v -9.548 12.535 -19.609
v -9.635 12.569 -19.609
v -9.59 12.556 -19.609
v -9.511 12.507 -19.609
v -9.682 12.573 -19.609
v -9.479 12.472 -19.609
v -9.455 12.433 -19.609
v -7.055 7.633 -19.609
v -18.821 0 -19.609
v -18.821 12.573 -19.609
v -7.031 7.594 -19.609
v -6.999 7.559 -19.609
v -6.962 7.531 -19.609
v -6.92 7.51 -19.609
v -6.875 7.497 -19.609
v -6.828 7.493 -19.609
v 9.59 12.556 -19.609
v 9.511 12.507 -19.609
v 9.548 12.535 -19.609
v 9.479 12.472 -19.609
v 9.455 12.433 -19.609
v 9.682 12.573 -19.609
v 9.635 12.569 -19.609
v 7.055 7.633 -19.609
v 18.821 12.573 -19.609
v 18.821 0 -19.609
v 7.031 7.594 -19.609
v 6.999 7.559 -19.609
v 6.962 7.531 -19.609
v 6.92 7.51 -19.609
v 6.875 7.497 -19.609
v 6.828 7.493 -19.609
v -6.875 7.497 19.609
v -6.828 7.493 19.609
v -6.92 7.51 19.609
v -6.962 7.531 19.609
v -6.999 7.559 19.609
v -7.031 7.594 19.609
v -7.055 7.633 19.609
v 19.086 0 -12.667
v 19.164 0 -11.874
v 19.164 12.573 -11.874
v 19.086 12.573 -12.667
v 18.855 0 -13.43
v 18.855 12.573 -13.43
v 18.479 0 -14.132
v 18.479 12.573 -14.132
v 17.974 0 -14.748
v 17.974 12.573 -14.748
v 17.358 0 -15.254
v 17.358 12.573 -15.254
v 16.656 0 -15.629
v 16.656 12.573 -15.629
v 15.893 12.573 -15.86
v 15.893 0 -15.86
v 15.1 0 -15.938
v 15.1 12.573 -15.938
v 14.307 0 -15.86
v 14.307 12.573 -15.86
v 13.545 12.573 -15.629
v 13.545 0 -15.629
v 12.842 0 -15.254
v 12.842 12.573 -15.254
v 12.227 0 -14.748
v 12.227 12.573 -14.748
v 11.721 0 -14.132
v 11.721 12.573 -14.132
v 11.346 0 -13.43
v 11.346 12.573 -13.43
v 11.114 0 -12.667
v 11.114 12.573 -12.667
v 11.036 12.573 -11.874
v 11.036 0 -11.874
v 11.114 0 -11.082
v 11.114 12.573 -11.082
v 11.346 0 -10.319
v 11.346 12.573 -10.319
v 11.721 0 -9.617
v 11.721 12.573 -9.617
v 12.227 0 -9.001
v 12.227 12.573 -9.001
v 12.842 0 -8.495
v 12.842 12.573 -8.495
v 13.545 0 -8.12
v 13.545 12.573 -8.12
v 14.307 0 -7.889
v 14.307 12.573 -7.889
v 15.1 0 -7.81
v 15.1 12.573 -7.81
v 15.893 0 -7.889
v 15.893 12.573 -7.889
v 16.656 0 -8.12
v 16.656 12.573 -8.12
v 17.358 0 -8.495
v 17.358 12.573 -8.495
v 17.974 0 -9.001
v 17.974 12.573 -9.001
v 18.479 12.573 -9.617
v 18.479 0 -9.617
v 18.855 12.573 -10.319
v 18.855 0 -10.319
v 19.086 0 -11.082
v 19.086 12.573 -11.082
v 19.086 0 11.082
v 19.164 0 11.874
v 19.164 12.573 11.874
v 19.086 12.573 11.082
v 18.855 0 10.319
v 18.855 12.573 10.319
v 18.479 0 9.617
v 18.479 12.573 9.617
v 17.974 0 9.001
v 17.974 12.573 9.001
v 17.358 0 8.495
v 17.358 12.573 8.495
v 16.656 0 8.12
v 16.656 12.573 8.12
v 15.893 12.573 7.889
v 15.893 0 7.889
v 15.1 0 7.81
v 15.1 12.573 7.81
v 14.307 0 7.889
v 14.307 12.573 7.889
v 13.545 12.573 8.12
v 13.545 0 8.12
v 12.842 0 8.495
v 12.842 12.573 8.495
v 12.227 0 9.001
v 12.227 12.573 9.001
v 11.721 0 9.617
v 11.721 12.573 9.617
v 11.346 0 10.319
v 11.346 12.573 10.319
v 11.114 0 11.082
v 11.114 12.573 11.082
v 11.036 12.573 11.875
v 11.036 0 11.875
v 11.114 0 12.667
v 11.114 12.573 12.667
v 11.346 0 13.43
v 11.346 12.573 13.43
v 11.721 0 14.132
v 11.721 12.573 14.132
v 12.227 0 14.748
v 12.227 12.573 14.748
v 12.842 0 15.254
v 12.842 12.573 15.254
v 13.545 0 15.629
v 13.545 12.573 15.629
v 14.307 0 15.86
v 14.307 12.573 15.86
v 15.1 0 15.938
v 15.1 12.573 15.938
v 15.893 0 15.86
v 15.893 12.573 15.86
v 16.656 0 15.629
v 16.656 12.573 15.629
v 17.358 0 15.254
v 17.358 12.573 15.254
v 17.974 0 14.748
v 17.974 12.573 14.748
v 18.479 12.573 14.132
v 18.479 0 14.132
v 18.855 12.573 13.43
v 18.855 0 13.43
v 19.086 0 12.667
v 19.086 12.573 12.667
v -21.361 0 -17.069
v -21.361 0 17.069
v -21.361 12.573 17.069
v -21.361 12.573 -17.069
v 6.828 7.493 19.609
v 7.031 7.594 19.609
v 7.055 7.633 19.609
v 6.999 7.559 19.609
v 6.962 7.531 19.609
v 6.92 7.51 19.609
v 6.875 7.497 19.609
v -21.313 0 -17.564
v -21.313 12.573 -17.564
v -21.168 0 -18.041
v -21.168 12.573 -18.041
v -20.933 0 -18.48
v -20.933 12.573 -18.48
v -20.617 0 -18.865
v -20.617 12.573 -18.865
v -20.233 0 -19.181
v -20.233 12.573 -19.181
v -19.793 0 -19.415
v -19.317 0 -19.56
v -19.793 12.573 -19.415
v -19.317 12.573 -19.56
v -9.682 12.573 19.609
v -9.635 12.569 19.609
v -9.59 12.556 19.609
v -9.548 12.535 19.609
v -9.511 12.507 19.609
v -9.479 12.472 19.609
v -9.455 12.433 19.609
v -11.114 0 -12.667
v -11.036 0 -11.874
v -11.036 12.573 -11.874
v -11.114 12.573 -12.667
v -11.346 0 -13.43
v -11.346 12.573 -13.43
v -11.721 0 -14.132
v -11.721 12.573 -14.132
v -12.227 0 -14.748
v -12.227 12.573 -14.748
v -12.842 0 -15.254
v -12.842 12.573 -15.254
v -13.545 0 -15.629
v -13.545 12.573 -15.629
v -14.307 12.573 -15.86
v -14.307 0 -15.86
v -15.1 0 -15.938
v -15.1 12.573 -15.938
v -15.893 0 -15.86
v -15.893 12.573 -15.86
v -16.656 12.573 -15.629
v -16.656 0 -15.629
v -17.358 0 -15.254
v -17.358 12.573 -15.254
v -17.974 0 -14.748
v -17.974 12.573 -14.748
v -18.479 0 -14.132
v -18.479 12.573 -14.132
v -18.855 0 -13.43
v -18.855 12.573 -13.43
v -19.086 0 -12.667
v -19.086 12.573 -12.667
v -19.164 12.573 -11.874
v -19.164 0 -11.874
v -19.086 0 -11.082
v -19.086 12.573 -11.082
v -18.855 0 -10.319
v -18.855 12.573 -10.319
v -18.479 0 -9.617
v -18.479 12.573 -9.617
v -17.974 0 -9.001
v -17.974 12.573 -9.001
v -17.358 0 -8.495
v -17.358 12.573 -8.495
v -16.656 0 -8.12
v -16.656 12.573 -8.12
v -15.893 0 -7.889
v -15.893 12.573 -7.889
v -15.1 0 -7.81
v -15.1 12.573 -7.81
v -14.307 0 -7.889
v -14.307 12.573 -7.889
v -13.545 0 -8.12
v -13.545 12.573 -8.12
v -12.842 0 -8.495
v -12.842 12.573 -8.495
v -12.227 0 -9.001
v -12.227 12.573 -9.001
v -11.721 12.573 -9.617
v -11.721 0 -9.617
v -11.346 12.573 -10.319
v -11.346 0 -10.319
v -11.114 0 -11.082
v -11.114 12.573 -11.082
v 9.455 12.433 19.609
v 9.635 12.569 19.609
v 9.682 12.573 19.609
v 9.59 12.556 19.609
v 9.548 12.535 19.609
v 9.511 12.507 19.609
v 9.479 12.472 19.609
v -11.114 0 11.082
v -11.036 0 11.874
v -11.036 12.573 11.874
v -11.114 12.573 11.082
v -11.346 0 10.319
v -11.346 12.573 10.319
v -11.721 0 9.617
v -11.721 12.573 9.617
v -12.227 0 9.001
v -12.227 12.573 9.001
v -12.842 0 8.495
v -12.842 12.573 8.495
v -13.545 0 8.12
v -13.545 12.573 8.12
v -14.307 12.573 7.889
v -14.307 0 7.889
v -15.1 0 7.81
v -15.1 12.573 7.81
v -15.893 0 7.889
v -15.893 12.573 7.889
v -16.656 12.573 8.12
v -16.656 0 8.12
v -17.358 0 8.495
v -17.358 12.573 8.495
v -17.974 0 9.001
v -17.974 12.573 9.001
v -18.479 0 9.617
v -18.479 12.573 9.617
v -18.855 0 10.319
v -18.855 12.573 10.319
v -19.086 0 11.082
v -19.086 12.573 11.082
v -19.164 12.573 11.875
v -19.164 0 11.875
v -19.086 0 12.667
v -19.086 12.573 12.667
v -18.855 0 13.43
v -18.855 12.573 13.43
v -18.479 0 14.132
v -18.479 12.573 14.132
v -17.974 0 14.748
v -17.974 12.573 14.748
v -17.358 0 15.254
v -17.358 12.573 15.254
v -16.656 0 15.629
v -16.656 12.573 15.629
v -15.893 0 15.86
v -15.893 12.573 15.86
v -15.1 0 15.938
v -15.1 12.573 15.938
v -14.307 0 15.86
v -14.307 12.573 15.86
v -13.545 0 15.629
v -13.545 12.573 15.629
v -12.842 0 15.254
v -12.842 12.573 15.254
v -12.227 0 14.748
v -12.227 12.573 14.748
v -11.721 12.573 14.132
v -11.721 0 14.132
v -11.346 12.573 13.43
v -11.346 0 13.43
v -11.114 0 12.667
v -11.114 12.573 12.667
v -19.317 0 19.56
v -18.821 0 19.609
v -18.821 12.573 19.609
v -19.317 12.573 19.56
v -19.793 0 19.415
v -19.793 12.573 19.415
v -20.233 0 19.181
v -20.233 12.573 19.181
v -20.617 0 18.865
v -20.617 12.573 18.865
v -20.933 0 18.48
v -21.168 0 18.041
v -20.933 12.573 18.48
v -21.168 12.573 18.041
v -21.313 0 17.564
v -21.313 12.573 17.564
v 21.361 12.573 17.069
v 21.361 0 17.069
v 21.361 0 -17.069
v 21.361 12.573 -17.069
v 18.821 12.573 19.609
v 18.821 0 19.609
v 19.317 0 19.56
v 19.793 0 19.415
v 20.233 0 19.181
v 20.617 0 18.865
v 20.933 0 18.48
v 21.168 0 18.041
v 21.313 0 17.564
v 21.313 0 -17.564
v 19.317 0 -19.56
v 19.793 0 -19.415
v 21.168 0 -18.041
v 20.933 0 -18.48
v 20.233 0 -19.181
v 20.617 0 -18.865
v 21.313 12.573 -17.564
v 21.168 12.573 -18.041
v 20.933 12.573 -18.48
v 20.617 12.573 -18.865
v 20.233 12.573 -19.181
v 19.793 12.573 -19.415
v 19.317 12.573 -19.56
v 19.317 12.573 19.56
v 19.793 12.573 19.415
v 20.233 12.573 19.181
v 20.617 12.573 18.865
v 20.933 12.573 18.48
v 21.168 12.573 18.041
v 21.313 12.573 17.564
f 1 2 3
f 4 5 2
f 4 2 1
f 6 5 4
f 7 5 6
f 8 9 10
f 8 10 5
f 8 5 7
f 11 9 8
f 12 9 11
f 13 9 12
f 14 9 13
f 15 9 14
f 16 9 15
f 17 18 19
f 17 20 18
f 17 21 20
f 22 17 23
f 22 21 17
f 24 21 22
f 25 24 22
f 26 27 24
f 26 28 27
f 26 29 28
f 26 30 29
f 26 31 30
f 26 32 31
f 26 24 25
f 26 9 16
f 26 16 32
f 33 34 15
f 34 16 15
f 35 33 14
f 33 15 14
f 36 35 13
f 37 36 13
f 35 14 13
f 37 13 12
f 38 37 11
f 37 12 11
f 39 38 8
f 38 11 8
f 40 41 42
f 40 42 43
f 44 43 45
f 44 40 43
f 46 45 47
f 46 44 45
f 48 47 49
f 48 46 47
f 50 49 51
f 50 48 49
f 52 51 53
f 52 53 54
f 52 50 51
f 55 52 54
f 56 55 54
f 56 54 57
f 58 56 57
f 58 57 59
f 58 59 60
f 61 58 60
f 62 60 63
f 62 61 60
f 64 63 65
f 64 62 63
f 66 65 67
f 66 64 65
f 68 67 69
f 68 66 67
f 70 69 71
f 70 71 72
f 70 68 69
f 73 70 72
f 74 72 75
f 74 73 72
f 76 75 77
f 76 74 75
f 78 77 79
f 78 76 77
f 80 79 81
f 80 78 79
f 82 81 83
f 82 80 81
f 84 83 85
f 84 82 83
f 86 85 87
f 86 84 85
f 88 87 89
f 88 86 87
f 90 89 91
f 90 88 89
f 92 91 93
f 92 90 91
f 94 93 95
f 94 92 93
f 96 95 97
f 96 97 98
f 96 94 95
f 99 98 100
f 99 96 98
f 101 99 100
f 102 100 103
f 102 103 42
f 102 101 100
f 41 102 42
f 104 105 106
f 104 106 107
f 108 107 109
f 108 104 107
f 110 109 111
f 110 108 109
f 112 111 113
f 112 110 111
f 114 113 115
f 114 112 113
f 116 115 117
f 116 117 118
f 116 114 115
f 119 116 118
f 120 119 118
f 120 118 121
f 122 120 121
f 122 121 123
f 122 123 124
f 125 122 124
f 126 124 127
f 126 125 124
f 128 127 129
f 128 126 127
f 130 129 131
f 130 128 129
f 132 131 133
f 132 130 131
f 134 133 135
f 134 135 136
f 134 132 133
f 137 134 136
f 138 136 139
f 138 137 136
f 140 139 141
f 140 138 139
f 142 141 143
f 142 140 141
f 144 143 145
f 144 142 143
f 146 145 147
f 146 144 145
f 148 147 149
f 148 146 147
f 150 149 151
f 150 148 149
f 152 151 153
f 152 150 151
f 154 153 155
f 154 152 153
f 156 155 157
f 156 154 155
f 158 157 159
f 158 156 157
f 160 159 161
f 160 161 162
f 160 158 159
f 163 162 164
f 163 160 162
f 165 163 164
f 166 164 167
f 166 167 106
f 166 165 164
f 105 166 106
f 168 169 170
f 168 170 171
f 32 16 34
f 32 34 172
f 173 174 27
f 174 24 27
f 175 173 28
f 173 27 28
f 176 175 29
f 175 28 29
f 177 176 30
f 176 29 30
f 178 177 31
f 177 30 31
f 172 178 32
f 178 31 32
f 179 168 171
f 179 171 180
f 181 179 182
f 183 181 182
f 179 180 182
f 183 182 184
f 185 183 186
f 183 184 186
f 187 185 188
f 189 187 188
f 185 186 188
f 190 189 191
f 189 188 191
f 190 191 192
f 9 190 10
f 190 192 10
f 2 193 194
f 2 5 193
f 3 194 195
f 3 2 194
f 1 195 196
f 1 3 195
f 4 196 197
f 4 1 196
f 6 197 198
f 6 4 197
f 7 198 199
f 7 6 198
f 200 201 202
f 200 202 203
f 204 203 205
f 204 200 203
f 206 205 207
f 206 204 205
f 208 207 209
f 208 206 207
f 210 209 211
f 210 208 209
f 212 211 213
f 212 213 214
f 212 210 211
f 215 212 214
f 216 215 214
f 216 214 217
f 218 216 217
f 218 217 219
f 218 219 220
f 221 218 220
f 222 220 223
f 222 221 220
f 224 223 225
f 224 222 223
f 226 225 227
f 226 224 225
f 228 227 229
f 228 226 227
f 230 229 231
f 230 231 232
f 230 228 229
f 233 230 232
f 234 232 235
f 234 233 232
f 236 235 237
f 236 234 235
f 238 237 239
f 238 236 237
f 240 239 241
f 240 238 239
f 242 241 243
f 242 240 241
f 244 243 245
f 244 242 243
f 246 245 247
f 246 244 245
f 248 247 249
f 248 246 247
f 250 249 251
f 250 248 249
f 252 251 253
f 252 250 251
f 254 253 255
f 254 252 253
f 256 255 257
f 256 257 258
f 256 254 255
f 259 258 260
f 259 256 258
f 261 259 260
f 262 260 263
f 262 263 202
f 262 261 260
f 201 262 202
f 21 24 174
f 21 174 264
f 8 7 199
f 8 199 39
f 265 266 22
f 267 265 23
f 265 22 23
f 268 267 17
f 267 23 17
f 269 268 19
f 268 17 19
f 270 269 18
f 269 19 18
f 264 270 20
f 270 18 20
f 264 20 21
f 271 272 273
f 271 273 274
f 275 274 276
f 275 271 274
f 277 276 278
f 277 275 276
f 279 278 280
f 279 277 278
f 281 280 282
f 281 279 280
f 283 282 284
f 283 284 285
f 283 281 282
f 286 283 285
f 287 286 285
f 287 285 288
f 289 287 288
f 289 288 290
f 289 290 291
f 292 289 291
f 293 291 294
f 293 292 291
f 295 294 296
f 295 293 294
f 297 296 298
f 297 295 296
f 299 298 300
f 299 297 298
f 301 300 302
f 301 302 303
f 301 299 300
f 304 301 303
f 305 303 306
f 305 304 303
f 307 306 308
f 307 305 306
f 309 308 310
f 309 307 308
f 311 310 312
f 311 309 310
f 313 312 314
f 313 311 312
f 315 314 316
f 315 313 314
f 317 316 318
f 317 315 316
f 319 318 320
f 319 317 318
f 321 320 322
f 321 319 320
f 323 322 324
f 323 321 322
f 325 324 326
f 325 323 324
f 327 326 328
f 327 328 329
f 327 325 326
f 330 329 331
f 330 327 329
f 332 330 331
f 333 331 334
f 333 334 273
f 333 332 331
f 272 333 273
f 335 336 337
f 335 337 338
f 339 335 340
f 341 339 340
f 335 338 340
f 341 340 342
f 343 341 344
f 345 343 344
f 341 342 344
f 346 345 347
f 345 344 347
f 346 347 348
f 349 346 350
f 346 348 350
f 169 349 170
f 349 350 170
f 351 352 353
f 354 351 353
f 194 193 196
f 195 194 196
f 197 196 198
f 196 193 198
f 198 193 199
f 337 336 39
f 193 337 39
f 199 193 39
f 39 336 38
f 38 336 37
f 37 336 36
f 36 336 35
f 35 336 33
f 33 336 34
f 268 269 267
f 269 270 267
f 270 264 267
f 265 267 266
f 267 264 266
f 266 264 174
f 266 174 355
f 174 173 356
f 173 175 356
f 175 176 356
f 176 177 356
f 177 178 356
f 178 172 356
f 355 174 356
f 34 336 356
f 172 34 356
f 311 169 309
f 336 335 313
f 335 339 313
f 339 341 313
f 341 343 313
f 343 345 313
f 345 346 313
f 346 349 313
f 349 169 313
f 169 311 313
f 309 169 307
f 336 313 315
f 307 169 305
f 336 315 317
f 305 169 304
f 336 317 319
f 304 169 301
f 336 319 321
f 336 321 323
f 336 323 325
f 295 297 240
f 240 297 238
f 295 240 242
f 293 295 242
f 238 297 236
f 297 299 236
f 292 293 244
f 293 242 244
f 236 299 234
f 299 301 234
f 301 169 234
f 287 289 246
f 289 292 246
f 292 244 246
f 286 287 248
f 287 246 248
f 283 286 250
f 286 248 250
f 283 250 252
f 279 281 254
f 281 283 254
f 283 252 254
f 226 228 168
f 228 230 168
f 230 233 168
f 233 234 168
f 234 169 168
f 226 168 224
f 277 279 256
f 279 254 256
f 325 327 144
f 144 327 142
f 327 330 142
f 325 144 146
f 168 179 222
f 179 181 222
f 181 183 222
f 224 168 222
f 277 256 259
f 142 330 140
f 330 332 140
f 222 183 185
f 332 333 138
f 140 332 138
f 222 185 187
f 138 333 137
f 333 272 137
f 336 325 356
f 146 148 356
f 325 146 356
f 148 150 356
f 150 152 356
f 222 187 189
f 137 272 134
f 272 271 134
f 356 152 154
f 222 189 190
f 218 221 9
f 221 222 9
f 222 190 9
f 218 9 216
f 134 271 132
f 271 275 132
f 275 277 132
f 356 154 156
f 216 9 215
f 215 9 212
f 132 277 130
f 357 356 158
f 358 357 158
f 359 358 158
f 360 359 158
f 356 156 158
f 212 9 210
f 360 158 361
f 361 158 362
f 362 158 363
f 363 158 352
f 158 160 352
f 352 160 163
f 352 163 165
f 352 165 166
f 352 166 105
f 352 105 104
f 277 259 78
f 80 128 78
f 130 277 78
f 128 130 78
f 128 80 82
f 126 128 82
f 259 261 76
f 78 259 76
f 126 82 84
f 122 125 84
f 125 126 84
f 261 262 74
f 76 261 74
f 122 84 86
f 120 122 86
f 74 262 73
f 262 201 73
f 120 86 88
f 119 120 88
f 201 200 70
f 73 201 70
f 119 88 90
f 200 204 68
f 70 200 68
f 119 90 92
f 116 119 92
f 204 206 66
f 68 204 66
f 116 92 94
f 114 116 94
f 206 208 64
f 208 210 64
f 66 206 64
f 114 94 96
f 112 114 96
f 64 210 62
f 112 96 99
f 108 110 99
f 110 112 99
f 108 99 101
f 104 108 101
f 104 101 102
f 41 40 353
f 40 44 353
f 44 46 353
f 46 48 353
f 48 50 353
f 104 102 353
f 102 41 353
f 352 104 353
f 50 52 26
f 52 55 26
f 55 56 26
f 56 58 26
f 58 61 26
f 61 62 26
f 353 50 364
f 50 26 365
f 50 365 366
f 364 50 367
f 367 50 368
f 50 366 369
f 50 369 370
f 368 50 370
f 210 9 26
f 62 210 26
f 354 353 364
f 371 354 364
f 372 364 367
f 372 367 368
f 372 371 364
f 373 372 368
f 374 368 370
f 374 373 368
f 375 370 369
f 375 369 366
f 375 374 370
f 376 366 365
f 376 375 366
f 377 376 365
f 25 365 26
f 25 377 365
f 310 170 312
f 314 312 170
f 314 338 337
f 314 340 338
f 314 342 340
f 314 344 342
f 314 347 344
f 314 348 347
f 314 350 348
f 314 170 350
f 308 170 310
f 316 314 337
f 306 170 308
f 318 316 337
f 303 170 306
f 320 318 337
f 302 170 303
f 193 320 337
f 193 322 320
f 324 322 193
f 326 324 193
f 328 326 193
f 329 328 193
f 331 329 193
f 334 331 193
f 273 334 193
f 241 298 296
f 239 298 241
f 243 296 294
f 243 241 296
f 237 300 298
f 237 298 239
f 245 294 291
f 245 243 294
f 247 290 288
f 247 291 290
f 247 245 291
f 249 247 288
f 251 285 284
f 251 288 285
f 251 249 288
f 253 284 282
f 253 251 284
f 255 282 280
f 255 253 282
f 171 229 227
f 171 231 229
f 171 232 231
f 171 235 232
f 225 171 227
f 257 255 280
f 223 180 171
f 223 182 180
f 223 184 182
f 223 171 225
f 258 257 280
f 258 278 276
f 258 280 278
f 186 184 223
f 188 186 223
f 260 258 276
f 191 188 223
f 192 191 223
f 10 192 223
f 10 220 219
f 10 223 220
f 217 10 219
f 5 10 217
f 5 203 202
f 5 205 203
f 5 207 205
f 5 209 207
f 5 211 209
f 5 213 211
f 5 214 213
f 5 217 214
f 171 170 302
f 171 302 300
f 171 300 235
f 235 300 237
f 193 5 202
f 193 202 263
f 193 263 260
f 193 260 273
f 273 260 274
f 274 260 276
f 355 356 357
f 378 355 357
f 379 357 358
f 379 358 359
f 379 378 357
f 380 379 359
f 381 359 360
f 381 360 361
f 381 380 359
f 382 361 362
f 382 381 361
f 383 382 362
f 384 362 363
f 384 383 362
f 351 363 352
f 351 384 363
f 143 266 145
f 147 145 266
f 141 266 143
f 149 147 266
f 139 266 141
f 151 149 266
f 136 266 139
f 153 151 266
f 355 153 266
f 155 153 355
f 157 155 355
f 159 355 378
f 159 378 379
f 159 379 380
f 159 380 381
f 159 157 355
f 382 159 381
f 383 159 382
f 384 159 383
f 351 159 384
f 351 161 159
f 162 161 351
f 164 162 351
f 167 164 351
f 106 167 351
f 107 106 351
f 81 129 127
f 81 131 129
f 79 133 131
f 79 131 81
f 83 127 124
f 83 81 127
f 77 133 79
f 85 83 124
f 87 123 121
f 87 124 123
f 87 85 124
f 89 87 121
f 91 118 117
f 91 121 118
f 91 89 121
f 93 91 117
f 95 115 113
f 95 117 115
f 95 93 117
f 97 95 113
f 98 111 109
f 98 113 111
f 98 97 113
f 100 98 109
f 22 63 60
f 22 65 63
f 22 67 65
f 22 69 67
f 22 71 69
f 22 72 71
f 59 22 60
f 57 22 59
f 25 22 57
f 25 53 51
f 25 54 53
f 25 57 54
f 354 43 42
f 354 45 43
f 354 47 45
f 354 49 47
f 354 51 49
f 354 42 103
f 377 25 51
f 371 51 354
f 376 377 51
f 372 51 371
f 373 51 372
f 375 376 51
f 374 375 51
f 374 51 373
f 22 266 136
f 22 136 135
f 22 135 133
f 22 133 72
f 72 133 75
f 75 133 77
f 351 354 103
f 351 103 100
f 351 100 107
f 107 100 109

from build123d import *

# Parameters (mm, degrees)
SKETCH1_W               = 42.7228
SKETCH1_H               = 39.2176
SKETCH1_R               = 4.064
BOSS_EXTRUDE1_DEPTH     = 12.573
CUT_EXTRUDE1_DEPTH      = 1
CUT_EXTRUDE1_DEPTH_BACK = 40.2176
FILLET1_R               = 0.254
FILLET2_R               = 2.54


with BuildPart() as part:
    # Sketch1 → Boss-Extrude1 (new body)
    with BuildSketch(Plane(origin=(0, 0, 0), x_dir=(1, 0, 0), z_dir=(0, 1, 0))):
        Rectangle(SKETCH1_W, SKETCH1_H)
        with Locations((15.1003, -11.8745)):
            Circle(SKETCH1_R, mode=Mode.SUBTRACT)
        with Locations((-15.1003, 11.8745)):
            Circle(SKETCH1_R, mode=Mode.SUBTRACT)
        with Locations((15.1003, 11.8745)):
            Circle(SKETCH1_R, mode=Mode.SUBTRACT)
        with Locations((-15.1003, -11.8745)):
            Circle(SKETCH1_R, mode=Mode.SUBTRACT)
    extrude(amount=BOSS_EXTRUDE1_DEPTH)

    # Sketch2 → Cut-Extrude1 (cut, two sides)
    with BuildSketch(Plane.XY.offset(19.6088)) as cut_extrude1_sk:
        Polygon((-9.525, 12.573), (-6.985, 7.493), (6.985, 7.493), (9.525, 12.573), align=None)
    extrude(amount=CUT_EXTRUDE1_DEPTH, mode=Mode.SUBTRACT)
    extrude(cut_extrude1_sk.sketch, amount=-CUT_EXTRUDE1_DEPTH_BACK, mode=Mode.SUBTRACT)

    # Fillet1
    fillet1_edges = [part.edges().sort_by_distance(p)[0] for p in [
        (-9.525, 12.573, 0),
        (9.525, 12.573, 0),
        (6.985, 7.493, 0),
        (-6.985, 7.493, 0),
    ]]
    fillet(fillet1_edges, radius=FILLET1_R)

    # Fillet2
    fillet2_edges = [part.edges().sort_by_distance(p)[0] for p in [
        (21.3614, 6.2865, 19.6088),
        (-21.3614, 6.2865, 19.6088),
        (-21.3614, 6.2865, -19.6088),
        (21.3614, 6.2865, -19.6088),
    ]]
    fillet(fillet2_edges, radius=FILLET2_R)


solid = part.part
